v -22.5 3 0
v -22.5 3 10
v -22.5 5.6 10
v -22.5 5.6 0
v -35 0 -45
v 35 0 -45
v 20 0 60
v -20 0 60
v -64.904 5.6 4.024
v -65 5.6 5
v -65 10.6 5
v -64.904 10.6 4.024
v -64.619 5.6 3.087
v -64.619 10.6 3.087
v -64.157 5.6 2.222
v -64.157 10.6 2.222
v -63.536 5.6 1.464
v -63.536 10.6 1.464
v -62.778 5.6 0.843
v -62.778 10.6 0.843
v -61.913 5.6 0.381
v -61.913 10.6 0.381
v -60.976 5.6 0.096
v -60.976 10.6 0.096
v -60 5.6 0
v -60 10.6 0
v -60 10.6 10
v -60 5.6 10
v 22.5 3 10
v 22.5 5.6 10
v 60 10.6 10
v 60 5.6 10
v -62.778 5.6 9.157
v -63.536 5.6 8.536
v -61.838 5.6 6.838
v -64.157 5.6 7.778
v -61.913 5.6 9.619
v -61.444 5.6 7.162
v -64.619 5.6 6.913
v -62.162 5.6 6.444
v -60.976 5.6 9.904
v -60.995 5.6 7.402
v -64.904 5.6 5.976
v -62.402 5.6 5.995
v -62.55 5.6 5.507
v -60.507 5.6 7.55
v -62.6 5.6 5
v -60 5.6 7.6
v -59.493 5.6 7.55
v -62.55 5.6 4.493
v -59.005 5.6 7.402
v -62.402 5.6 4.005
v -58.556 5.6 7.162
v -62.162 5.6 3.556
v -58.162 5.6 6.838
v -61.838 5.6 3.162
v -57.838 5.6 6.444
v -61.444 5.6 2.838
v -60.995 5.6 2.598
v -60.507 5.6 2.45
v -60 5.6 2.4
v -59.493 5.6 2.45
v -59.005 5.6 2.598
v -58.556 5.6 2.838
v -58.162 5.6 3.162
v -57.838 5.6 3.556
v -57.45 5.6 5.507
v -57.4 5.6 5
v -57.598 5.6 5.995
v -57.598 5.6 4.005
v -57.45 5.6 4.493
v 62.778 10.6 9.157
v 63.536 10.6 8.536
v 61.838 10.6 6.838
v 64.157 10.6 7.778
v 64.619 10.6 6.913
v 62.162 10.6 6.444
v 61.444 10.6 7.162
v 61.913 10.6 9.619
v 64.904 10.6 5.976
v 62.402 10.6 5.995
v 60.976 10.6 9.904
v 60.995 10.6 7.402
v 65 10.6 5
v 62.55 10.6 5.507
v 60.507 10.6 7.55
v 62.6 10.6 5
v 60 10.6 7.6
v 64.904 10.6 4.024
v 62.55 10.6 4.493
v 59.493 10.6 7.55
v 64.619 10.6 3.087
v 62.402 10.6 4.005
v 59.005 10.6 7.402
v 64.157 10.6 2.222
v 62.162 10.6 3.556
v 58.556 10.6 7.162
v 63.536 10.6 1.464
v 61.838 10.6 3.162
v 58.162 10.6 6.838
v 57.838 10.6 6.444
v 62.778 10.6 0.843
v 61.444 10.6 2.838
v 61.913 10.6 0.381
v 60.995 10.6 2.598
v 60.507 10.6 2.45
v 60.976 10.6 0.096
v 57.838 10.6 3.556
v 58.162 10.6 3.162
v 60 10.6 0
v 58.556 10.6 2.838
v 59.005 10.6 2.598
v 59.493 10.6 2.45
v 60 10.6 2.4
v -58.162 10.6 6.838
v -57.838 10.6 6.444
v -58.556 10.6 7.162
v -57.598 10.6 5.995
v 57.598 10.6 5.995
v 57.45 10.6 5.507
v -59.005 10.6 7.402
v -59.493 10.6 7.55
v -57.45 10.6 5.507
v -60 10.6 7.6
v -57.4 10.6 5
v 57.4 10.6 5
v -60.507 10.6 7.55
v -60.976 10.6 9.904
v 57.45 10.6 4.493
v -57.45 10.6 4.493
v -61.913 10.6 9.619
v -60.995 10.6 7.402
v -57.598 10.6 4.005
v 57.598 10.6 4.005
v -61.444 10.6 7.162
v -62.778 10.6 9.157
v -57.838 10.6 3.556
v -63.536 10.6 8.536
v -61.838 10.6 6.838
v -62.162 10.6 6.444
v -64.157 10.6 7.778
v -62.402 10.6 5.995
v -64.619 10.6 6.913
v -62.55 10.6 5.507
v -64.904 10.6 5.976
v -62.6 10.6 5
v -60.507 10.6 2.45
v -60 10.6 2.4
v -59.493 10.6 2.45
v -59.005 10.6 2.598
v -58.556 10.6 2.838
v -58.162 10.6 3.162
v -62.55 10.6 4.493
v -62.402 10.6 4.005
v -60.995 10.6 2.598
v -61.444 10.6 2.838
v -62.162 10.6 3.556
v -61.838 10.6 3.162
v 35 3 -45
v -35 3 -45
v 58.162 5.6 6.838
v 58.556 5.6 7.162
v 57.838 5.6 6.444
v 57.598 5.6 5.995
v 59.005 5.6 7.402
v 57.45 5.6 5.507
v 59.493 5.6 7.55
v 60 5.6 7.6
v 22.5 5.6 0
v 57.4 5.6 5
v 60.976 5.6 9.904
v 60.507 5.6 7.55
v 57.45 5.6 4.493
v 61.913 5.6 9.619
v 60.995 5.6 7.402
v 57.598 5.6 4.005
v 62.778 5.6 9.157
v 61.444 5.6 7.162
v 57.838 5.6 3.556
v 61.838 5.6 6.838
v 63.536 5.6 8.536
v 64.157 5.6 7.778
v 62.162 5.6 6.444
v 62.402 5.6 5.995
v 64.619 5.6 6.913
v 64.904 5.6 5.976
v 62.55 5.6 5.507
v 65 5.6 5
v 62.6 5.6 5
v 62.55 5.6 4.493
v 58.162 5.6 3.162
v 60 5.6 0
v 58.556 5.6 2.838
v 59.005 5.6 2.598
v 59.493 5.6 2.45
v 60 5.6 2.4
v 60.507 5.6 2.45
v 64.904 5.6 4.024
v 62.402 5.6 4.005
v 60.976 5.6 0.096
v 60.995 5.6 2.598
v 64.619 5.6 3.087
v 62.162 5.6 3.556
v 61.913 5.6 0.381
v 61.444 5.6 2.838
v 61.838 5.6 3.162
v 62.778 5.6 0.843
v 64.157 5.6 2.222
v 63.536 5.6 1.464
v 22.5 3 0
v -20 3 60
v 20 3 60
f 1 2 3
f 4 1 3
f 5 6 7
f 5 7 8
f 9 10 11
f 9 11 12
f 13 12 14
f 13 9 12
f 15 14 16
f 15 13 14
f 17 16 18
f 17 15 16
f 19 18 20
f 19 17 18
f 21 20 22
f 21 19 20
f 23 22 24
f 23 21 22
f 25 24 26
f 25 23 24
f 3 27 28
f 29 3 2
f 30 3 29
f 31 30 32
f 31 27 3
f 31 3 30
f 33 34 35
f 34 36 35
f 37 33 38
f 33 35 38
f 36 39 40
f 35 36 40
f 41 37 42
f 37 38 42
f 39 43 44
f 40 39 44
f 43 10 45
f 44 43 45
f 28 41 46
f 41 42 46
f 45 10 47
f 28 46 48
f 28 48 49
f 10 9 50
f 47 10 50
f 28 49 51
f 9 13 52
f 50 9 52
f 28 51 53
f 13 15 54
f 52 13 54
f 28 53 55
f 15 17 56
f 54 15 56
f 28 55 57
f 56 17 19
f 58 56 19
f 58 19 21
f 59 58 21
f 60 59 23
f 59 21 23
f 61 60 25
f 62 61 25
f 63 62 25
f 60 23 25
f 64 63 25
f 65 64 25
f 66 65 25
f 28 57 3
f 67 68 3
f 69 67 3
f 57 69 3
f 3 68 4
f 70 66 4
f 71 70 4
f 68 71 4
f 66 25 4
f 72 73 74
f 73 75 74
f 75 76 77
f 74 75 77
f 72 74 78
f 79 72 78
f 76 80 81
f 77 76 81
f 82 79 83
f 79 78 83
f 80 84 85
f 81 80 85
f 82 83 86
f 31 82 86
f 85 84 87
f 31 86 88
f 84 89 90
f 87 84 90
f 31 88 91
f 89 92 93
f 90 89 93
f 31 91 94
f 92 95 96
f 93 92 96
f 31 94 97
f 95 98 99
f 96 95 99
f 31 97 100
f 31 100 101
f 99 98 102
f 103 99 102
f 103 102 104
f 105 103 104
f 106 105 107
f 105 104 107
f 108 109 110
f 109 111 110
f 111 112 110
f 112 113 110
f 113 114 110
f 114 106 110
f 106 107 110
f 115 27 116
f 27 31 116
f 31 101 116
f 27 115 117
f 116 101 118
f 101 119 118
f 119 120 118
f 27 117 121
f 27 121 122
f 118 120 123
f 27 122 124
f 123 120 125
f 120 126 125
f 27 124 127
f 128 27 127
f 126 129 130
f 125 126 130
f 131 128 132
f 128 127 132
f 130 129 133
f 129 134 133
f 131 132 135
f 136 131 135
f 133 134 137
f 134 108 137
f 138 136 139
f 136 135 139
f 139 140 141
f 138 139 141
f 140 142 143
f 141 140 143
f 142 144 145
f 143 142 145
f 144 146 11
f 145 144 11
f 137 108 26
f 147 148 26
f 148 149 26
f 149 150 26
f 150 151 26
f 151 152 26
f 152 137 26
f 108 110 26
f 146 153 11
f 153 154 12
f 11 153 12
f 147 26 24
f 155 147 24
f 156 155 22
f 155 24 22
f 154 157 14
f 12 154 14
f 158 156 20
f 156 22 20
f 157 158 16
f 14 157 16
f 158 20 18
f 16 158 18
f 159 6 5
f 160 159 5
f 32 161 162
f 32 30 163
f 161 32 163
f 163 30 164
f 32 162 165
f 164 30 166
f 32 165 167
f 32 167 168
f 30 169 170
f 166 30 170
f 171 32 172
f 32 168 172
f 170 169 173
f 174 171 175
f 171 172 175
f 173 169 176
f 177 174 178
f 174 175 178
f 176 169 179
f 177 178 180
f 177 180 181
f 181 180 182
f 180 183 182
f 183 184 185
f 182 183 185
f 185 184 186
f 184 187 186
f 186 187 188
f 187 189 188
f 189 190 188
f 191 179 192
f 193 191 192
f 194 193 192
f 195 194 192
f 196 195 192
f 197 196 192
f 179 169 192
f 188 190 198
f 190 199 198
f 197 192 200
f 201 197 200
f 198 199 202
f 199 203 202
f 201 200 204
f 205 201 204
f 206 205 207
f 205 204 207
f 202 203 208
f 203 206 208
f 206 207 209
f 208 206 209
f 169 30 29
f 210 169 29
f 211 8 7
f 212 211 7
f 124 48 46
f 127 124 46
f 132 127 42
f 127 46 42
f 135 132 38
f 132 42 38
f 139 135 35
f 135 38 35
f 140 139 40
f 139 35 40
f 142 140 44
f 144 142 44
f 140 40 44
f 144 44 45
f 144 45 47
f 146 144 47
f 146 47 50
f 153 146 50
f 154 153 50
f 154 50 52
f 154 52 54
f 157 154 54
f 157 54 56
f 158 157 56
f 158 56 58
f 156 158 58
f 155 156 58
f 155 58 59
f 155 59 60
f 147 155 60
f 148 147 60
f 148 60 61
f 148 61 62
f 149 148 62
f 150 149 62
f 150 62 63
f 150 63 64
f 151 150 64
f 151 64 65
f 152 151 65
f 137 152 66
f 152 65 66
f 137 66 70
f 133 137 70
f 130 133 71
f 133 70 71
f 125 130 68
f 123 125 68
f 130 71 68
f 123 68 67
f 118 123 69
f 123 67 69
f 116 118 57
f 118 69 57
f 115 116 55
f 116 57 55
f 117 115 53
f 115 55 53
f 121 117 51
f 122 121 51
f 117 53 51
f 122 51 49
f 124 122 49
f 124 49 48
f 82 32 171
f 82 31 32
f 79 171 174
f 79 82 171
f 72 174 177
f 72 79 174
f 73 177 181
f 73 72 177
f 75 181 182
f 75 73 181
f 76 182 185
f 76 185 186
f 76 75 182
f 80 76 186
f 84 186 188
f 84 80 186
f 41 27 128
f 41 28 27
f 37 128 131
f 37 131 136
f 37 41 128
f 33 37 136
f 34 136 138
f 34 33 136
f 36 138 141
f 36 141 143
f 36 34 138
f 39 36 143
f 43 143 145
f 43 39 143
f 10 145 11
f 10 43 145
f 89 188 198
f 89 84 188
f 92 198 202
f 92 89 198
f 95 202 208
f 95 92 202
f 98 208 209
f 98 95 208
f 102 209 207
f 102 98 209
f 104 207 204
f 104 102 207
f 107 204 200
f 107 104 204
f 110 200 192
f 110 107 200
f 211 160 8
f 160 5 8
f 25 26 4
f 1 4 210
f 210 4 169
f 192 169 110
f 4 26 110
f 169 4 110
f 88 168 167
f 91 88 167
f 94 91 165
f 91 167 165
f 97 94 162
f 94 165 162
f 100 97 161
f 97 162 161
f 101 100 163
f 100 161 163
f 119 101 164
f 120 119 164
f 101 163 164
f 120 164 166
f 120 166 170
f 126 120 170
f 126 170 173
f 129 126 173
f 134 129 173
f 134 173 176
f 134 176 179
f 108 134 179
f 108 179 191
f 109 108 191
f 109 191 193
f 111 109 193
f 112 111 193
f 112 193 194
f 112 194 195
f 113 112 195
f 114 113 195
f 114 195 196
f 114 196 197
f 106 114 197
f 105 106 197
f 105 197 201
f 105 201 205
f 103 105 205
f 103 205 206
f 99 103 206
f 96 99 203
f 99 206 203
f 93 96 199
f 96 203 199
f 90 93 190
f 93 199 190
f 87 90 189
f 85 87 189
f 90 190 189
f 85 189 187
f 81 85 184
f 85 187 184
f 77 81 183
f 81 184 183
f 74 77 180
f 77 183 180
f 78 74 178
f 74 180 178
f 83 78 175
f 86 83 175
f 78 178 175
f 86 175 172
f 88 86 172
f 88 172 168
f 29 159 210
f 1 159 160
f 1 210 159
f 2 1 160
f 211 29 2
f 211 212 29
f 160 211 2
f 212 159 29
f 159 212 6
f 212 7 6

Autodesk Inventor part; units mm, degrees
ref_plane "YZ Plane" through (0, 0, 0) normal (1, 0, 0) x (0, 1, 0)
ref_plane "XZ Plane" through (0, 0, 0) normal (0, 1, 0) x (-1, 0, 0)
ref_plane "XY Plane" through (0, 0, 0) normal (0, 0, 1) x (1, 0, 0)
sketch "Sketch1" plane through (0, 0, 0) normal (0, 1, 0) x (-1, 0, 0)
  line L0 (0, -66) -> (0, 81) projected
  line L1 (-49, 0) -> (49, 0) projected
  line L2 (-35, -45) -> (35, -45)
  line L3 (20, 60) -> (-20, 60)
  line L4 (-20, 60) -> (-35, -45)
  line L5 (35, -45) -> (20, 60)
  point P0 (0, 0)
  dimension "d0" = 70
  dimension "d1" = 105
  dimension "d3" = 40
  dimension "d6" = 45
extrude "Extrusion1" add sketch "Sketch1" along normal blind 3
sketch "Sketch2" plane through (0, 0, 0) normal (0, 0, 1) x (1, 0, 0)
  line L0 (-91, 0) -> (91, 0) projected
  line L1 (0, 12.72) -> (0, -2.12) projected
  line L2 (35, 3) -> (-35, 3) projected
  line L3 (22.5, 3) -> (-22.5, 3)
  line L4 (-22.5, 3) -> (-22.5, 5.6)
  line L5 (22.5, 5.6) -> (22.5, 3)
  line L6 (22.5, 5.6) -> (65, 5.6)
  line L7 (65, 5.6) -> (65, 10.6)
  line L8 (65, 10.6) -> (-65, 10.6)
  line L9 (-65, 10.6) -> (-65, 5.6)
  line L10 (-65, 5.6) -> (-22.5, 5.6)
  line L11 (-35, 0) -> (-35, 3) projected
  line L12 (35, 0) -> (35, 3) projected
  point P0 (0, 0)
  point P1 (-22.5, 3)
  point P2 (22.5, 3)
  dimension "d8" = 2.6
  dimension "d9" = 130
  dimension "d10" = 5
  dimension "d11" = 2.6
  dimension "d22" = 45
extrude "Extrusion2" add sketch "Sketch2" along normal blind 10 contours L2 L4 L10 L9 L8 L1 | L1 L8 L7 L6 L5 L2
fillet "Fillet1" radius 5 4 edges at (65, 8.1, 0) (65, 8.1, 10) (-65, 8.1, 0) (-65, 8.1, 10)
sketch "Sketch3" plane through (-60, 10.6, 0) normal (0, 1, 0) x (1, 0, 0)
  arc A0 (0, 0) -> (0, -10) centre (0, -5) ccw projected
  arc A1 (120, -10) -> (120, 0) centre (120, -5) ccw projected
  point P0 (60, 0)
hole "Hole1" at (60, 10.6, 5) at (-60, 10.6, 5) direction (0, -1, 0) diameter 5.2 end through all
properties part number "karoserie2"
